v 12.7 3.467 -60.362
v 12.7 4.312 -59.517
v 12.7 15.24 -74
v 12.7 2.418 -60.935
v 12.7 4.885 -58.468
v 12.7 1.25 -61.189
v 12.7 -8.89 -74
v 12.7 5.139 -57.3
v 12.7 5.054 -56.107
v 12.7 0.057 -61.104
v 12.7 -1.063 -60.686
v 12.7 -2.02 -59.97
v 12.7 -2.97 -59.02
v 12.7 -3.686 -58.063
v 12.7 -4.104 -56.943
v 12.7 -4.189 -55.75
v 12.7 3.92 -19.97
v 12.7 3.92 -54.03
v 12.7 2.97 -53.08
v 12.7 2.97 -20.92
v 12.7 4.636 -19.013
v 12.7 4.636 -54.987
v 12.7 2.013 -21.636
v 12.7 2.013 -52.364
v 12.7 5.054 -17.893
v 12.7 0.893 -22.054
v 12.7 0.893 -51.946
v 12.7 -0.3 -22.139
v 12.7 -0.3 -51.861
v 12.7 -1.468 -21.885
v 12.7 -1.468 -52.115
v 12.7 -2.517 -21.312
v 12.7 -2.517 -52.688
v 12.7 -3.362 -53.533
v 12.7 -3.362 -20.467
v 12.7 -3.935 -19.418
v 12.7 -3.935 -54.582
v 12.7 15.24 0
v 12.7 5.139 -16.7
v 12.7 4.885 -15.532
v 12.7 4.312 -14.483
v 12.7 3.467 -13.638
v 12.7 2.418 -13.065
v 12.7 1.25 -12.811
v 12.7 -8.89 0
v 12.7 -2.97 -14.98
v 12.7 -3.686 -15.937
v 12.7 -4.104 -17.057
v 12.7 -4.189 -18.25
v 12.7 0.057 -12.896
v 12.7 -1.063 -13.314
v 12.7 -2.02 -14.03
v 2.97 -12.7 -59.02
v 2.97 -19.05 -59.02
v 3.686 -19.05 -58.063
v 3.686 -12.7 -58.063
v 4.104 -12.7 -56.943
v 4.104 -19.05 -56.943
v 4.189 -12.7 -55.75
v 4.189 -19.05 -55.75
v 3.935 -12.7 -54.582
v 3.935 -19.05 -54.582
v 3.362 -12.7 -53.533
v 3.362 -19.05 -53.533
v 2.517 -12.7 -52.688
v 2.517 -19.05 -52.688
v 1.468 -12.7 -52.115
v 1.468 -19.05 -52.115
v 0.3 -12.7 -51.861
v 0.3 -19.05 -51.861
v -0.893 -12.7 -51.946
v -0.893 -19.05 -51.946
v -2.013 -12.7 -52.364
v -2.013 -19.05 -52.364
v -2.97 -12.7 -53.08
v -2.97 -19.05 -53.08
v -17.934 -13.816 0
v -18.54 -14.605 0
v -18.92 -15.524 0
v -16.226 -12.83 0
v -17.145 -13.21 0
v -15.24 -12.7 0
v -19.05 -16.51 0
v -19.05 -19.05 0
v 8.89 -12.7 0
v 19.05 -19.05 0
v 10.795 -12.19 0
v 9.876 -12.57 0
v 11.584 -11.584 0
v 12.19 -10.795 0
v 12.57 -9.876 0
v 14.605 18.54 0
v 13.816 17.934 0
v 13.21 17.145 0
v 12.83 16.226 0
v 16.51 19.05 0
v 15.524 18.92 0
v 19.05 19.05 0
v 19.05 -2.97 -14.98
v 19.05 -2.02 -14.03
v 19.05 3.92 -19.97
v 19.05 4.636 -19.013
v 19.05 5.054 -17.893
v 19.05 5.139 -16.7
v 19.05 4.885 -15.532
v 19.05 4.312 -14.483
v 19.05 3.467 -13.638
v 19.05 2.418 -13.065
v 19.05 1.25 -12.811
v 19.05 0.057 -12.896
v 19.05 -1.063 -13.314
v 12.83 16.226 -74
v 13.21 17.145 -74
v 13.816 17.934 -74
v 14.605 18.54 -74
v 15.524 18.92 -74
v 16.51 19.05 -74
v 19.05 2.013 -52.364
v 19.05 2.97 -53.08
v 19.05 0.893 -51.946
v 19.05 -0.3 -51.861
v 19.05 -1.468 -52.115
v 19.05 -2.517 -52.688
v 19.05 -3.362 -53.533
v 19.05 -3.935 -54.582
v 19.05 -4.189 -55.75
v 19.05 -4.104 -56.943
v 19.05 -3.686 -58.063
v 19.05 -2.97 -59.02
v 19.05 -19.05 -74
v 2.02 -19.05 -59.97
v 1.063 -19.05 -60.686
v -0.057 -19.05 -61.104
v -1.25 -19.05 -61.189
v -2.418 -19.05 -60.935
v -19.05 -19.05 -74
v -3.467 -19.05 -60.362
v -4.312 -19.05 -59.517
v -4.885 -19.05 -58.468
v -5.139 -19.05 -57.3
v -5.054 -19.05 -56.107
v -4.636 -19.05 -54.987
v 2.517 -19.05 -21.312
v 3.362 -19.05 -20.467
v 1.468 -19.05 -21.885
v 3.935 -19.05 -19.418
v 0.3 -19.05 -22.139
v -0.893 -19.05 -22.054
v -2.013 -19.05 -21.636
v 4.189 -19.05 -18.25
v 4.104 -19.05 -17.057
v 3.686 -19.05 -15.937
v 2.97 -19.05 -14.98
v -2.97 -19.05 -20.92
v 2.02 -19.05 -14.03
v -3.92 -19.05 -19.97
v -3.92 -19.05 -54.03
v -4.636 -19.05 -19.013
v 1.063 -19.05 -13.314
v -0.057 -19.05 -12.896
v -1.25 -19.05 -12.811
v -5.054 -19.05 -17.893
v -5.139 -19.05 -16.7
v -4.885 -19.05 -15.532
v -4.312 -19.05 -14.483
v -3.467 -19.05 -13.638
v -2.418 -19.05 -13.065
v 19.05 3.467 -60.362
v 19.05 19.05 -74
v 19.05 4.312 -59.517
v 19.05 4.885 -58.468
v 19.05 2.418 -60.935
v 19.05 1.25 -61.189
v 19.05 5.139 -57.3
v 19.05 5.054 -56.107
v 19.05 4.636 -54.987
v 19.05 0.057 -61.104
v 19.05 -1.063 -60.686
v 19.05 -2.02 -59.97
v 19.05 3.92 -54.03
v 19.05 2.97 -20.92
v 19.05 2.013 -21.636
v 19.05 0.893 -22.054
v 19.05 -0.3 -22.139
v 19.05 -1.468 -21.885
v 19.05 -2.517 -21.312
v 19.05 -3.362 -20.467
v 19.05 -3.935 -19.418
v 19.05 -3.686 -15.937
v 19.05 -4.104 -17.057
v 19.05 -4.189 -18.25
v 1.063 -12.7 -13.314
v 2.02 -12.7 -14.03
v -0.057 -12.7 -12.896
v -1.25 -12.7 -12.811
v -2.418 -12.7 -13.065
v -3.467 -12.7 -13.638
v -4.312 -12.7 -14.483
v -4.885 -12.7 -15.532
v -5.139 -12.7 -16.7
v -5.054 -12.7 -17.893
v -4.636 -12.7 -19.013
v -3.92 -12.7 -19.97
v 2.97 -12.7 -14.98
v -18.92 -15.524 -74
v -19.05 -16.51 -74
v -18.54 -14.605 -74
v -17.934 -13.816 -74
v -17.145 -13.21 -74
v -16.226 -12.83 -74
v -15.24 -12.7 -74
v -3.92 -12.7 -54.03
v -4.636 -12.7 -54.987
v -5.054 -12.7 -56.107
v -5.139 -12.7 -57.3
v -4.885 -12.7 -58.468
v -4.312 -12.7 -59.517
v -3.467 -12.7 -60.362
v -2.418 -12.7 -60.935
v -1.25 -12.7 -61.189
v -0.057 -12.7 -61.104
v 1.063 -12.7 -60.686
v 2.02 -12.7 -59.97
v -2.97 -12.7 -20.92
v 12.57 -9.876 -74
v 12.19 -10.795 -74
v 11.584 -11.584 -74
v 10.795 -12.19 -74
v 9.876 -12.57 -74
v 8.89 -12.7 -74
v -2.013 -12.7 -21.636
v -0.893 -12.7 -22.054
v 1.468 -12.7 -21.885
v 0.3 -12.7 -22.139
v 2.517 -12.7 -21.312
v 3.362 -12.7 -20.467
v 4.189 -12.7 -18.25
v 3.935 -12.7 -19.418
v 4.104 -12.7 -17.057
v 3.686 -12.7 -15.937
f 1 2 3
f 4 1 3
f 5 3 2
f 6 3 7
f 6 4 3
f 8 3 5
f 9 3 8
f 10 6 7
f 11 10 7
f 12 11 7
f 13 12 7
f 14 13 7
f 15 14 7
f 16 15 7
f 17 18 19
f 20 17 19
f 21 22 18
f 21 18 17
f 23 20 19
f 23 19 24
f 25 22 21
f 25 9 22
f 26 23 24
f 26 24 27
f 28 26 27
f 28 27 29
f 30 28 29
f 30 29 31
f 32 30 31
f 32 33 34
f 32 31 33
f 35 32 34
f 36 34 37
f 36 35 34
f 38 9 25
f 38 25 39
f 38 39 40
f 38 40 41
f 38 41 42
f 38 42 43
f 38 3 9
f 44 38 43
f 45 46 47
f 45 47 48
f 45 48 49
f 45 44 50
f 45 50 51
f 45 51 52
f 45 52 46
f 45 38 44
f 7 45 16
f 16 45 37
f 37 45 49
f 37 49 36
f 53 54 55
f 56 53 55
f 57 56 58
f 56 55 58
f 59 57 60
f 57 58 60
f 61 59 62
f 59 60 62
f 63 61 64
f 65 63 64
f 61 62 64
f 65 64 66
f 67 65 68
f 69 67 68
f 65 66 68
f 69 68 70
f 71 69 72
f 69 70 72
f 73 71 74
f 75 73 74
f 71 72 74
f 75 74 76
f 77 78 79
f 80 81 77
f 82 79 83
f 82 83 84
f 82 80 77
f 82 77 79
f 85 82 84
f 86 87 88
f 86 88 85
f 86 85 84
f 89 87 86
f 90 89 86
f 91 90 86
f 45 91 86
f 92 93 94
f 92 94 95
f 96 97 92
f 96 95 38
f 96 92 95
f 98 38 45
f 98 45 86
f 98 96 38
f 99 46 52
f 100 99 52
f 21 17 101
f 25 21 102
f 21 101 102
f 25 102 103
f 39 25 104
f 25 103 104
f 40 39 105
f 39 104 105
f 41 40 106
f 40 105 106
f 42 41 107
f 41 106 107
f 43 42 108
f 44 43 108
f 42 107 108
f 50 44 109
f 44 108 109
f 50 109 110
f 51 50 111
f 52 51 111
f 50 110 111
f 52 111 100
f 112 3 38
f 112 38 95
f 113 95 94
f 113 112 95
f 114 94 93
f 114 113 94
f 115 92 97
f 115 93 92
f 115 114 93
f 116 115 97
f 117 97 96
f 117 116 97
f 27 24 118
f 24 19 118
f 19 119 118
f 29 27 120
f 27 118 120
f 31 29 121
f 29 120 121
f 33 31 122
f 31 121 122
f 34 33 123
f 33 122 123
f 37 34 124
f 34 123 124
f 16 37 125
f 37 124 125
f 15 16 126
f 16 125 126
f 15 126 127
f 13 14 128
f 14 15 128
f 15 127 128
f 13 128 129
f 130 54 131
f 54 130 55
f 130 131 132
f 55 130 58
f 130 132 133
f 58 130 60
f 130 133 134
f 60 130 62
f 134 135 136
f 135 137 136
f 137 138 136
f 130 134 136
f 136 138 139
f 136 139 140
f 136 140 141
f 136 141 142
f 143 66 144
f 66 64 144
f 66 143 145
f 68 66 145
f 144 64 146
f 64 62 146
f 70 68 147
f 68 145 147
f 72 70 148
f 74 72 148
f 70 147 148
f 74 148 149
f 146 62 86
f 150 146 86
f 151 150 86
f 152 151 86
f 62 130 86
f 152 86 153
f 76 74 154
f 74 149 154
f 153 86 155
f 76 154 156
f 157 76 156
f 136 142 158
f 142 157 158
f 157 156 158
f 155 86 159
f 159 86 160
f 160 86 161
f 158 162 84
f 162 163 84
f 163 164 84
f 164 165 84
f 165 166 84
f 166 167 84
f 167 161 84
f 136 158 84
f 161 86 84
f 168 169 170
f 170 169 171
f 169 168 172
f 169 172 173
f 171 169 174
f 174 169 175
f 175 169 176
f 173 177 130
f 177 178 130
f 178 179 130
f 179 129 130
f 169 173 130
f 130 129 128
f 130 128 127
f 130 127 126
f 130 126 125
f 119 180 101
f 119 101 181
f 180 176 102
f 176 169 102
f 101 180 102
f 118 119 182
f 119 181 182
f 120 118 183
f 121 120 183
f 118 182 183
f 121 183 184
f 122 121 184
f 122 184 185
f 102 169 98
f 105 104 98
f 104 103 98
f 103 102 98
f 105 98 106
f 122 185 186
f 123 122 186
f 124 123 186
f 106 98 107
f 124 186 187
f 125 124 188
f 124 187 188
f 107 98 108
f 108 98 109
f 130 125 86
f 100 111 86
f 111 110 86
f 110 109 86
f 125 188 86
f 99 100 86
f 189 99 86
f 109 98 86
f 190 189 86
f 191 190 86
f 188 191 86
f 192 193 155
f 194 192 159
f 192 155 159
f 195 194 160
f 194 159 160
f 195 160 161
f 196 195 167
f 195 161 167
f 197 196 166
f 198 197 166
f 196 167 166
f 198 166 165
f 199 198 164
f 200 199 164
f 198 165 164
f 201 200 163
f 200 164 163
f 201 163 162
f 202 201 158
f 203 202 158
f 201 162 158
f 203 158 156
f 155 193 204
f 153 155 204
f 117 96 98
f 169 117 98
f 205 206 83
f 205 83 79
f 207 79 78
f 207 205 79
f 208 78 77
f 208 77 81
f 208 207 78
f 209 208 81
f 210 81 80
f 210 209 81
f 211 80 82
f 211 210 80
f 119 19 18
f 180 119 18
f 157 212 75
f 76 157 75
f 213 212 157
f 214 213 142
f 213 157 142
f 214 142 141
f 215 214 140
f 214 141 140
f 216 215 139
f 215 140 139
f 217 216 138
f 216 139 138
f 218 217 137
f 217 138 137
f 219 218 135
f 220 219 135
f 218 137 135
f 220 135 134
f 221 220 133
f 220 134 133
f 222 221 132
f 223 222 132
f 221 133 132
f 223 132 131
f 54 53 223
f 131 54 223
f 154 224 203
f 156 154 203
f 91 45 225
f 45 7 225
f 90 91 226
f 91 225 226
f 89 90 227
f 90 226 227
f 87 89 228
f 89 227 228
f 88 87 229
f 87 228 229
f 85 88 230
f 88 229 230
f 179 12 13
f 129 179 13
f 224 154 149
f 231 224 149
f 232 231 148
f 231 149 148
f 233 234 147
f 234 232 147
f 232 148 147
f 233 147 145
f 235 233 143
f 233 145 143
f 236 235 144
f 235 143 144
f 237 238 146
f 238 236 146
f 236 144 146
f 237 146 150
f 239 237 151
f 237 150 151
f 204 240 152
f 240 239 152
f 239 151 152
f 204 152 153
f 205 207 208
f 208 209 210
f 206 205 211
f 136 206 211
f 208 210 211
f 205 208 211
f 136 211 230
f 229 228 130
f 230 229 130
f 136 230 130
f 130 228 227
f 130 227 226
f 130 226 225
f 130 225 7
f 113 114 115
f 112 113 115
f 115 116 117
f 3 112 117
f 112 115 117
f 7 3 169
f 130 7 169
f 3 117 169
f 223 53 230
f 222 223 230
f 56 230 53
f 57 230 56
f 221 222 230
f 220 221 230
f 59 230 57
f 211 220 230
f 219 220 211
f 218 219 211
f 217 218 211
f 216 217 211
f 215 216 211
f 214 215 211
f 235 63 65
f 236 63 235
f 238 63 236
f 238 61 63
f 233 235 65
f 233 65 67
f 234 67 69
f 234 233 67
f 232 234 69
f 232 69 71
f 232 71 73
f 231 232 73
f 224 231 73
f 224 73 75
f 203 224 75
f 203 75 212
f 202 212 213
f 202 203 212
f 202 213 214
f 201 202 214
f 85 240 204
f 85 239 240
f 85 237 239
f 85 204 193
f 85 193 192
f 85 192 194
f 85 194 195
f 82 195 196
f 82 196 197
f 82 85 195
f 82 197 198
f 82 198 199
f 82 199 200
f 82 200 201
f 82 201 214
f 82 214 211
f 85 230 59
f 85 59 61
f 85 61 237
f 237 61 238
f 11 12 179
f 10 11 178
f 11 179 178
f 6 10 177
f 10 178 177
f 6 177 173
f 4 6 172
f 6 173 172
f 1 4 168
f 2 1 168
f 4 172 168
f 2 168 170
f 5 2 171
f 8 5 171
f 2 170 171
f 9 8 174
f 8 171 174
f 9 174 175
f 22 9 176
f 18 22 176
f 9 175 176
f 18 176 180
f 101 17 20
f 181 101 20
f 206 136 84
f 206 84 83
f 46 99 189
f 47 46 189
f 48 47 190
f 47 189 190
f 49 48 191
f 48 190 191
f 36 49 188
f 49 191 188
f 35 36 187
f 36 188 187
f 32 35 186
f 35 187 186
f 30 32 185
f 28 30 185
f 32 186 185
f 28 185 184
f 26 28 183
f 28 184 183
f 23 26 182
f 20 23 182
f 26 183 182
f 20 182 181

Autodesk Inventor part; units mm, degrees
ref_plane "YZ Plane" through (0, 0, 0) normal (1, 0, 0) x (0, 1, 0)
sketch "Sketch1" plane through (0, 0, 0) normal (0, 0, 1) x (1, 0, 0)
  line L0 (-19.05, 19.05) -> (19.05, 19.05)
  line L1 (19.05, 19.05) -> (19.05, -19.05)
  line L2 (19.05, -19.05) -> (-19.05, -19.05)
  line L3 (-19.05, -19.05) -> (-19.05, 19.05)
  point P0 (0, 0)
  dimension "d0" = 38.1
  dimension "d1" = 38.1
  dimension "d2" = 19.05
  dimension "d3" = 19.05
extrude "Extrusion1" add sketch "Sketch1" against normal blind 74
sketch "Sketch2" plane through (0, 0, 0) normal (0, 0, 1) x (1, 0, 0)
  line L0 (19.05, -19.05) -> (-19.05, -19.05) projected
  line L1 (19.05, 19.05) -> (19.05, -19.05) projected
  line L2 (-19.05, 19.05) -> (12.7, 19.05)
  line L3 (12.7, 19.05) -> (12.7, -12.7)
  line L4 (12.7, -12.7) -> (-19.05, -12.7)
  line L5 (-19.05, -12.7) -> (-19.05, 19.05)
  dimension "d6" = 6.35
  dimension "d7" = 6.35
extrude "Extrusion2" cut sketch "Sketch2" against normal through all
ref_plane "Work Plane1" through (0, 0, -37) normal (0, 0, 1) x (1, 0, 0)
fillet "Fillet1" radius 3.81 3 edges at (12.7, 19.05, -37) (-19.05, -12.7, -37) (12.7, -12.7, -37)
ref_plane "Work Plane2" through (19.05, -19.05, 0) normal (-0.7071, -0.7071, 0) x (0, 0, -1)
sketch "Sketch7" plane through (12.7, -8.89, 0) normal (-1, 0, 0) x (0, 0, 1)
  line L0 (0, -10.16) -> (-74, -10.16) projected
  line L1 (0, -10.16) -> (-74, -10.16) projected
  line L2 (-37, 35.56) -> (-37, -17.78) projected
  point P0 (-17, 9.84)
  point P1 (-17.95, 8.89)
  dimension "d29" = 20
  dimension "d30" = 19.05
  dimension "d31" = 20
  dimension "d32" = 19.05
hole "Hole2" at (12.7, 0.95, -17) at (12.7, 0, -17.95) direction (1, 0, 0) diameter 8.4 end through all clearance for "Socket Head Cap Screw" size "M8" standard "Ansi Metric M Profile"
mirror "Mirror4" about plane through (0, 0, -37) normal (0, 0, 1) of "Hole2"
mirror "Mirror5" about plane through (19.05, -19.05, 0) normal (-0.7071, -0.7071, 0) of "Hole2", "Mirror4"
sketch "Sketch9" plane through (12.7, -8.89, 0) normal (-1, 0, 0) x (0, 0, 1)
  arc A0 (-20.4066, 12.2966) -> (-14.5434, 6.4334) centre (-17.95, 8.89) ccw projected
  arc A1 (-14.5434, 6.4334) -> (-20.4066, 12.2966) centre (-17, 9.84) ccw projected
  line L0 (-19.9698, 12.8098) -> (-20.9198, 11.8598)
  line L1 (-14.9802, 5.9202) -> (-14.0302, 6.8702)
extrude "Extrusion7" cut sketch "Sketch9" against normal through all contours A0 L0 A1 | A0 A1 L1
mirror "Mirror6" about plane through (0, 0, -37) normal (0, 0, 1) of "Extrusion7"
mirror "Mirror7" about plane through (19.05, -19.05, 0) normal (-0.7071, -0.7071, 0) of "Extrusion7", "Mirror6"
equation "\"d1\" = d0"
equation "\"d2\" = 0.5 * d1"
equation "\"d3\" = d2"
equation "\"d7\" = d6"
equation "\"d31\" = d29"
equation "\"d32\" = d30"
properties part number "28-604" material "Aluminum-6061"
